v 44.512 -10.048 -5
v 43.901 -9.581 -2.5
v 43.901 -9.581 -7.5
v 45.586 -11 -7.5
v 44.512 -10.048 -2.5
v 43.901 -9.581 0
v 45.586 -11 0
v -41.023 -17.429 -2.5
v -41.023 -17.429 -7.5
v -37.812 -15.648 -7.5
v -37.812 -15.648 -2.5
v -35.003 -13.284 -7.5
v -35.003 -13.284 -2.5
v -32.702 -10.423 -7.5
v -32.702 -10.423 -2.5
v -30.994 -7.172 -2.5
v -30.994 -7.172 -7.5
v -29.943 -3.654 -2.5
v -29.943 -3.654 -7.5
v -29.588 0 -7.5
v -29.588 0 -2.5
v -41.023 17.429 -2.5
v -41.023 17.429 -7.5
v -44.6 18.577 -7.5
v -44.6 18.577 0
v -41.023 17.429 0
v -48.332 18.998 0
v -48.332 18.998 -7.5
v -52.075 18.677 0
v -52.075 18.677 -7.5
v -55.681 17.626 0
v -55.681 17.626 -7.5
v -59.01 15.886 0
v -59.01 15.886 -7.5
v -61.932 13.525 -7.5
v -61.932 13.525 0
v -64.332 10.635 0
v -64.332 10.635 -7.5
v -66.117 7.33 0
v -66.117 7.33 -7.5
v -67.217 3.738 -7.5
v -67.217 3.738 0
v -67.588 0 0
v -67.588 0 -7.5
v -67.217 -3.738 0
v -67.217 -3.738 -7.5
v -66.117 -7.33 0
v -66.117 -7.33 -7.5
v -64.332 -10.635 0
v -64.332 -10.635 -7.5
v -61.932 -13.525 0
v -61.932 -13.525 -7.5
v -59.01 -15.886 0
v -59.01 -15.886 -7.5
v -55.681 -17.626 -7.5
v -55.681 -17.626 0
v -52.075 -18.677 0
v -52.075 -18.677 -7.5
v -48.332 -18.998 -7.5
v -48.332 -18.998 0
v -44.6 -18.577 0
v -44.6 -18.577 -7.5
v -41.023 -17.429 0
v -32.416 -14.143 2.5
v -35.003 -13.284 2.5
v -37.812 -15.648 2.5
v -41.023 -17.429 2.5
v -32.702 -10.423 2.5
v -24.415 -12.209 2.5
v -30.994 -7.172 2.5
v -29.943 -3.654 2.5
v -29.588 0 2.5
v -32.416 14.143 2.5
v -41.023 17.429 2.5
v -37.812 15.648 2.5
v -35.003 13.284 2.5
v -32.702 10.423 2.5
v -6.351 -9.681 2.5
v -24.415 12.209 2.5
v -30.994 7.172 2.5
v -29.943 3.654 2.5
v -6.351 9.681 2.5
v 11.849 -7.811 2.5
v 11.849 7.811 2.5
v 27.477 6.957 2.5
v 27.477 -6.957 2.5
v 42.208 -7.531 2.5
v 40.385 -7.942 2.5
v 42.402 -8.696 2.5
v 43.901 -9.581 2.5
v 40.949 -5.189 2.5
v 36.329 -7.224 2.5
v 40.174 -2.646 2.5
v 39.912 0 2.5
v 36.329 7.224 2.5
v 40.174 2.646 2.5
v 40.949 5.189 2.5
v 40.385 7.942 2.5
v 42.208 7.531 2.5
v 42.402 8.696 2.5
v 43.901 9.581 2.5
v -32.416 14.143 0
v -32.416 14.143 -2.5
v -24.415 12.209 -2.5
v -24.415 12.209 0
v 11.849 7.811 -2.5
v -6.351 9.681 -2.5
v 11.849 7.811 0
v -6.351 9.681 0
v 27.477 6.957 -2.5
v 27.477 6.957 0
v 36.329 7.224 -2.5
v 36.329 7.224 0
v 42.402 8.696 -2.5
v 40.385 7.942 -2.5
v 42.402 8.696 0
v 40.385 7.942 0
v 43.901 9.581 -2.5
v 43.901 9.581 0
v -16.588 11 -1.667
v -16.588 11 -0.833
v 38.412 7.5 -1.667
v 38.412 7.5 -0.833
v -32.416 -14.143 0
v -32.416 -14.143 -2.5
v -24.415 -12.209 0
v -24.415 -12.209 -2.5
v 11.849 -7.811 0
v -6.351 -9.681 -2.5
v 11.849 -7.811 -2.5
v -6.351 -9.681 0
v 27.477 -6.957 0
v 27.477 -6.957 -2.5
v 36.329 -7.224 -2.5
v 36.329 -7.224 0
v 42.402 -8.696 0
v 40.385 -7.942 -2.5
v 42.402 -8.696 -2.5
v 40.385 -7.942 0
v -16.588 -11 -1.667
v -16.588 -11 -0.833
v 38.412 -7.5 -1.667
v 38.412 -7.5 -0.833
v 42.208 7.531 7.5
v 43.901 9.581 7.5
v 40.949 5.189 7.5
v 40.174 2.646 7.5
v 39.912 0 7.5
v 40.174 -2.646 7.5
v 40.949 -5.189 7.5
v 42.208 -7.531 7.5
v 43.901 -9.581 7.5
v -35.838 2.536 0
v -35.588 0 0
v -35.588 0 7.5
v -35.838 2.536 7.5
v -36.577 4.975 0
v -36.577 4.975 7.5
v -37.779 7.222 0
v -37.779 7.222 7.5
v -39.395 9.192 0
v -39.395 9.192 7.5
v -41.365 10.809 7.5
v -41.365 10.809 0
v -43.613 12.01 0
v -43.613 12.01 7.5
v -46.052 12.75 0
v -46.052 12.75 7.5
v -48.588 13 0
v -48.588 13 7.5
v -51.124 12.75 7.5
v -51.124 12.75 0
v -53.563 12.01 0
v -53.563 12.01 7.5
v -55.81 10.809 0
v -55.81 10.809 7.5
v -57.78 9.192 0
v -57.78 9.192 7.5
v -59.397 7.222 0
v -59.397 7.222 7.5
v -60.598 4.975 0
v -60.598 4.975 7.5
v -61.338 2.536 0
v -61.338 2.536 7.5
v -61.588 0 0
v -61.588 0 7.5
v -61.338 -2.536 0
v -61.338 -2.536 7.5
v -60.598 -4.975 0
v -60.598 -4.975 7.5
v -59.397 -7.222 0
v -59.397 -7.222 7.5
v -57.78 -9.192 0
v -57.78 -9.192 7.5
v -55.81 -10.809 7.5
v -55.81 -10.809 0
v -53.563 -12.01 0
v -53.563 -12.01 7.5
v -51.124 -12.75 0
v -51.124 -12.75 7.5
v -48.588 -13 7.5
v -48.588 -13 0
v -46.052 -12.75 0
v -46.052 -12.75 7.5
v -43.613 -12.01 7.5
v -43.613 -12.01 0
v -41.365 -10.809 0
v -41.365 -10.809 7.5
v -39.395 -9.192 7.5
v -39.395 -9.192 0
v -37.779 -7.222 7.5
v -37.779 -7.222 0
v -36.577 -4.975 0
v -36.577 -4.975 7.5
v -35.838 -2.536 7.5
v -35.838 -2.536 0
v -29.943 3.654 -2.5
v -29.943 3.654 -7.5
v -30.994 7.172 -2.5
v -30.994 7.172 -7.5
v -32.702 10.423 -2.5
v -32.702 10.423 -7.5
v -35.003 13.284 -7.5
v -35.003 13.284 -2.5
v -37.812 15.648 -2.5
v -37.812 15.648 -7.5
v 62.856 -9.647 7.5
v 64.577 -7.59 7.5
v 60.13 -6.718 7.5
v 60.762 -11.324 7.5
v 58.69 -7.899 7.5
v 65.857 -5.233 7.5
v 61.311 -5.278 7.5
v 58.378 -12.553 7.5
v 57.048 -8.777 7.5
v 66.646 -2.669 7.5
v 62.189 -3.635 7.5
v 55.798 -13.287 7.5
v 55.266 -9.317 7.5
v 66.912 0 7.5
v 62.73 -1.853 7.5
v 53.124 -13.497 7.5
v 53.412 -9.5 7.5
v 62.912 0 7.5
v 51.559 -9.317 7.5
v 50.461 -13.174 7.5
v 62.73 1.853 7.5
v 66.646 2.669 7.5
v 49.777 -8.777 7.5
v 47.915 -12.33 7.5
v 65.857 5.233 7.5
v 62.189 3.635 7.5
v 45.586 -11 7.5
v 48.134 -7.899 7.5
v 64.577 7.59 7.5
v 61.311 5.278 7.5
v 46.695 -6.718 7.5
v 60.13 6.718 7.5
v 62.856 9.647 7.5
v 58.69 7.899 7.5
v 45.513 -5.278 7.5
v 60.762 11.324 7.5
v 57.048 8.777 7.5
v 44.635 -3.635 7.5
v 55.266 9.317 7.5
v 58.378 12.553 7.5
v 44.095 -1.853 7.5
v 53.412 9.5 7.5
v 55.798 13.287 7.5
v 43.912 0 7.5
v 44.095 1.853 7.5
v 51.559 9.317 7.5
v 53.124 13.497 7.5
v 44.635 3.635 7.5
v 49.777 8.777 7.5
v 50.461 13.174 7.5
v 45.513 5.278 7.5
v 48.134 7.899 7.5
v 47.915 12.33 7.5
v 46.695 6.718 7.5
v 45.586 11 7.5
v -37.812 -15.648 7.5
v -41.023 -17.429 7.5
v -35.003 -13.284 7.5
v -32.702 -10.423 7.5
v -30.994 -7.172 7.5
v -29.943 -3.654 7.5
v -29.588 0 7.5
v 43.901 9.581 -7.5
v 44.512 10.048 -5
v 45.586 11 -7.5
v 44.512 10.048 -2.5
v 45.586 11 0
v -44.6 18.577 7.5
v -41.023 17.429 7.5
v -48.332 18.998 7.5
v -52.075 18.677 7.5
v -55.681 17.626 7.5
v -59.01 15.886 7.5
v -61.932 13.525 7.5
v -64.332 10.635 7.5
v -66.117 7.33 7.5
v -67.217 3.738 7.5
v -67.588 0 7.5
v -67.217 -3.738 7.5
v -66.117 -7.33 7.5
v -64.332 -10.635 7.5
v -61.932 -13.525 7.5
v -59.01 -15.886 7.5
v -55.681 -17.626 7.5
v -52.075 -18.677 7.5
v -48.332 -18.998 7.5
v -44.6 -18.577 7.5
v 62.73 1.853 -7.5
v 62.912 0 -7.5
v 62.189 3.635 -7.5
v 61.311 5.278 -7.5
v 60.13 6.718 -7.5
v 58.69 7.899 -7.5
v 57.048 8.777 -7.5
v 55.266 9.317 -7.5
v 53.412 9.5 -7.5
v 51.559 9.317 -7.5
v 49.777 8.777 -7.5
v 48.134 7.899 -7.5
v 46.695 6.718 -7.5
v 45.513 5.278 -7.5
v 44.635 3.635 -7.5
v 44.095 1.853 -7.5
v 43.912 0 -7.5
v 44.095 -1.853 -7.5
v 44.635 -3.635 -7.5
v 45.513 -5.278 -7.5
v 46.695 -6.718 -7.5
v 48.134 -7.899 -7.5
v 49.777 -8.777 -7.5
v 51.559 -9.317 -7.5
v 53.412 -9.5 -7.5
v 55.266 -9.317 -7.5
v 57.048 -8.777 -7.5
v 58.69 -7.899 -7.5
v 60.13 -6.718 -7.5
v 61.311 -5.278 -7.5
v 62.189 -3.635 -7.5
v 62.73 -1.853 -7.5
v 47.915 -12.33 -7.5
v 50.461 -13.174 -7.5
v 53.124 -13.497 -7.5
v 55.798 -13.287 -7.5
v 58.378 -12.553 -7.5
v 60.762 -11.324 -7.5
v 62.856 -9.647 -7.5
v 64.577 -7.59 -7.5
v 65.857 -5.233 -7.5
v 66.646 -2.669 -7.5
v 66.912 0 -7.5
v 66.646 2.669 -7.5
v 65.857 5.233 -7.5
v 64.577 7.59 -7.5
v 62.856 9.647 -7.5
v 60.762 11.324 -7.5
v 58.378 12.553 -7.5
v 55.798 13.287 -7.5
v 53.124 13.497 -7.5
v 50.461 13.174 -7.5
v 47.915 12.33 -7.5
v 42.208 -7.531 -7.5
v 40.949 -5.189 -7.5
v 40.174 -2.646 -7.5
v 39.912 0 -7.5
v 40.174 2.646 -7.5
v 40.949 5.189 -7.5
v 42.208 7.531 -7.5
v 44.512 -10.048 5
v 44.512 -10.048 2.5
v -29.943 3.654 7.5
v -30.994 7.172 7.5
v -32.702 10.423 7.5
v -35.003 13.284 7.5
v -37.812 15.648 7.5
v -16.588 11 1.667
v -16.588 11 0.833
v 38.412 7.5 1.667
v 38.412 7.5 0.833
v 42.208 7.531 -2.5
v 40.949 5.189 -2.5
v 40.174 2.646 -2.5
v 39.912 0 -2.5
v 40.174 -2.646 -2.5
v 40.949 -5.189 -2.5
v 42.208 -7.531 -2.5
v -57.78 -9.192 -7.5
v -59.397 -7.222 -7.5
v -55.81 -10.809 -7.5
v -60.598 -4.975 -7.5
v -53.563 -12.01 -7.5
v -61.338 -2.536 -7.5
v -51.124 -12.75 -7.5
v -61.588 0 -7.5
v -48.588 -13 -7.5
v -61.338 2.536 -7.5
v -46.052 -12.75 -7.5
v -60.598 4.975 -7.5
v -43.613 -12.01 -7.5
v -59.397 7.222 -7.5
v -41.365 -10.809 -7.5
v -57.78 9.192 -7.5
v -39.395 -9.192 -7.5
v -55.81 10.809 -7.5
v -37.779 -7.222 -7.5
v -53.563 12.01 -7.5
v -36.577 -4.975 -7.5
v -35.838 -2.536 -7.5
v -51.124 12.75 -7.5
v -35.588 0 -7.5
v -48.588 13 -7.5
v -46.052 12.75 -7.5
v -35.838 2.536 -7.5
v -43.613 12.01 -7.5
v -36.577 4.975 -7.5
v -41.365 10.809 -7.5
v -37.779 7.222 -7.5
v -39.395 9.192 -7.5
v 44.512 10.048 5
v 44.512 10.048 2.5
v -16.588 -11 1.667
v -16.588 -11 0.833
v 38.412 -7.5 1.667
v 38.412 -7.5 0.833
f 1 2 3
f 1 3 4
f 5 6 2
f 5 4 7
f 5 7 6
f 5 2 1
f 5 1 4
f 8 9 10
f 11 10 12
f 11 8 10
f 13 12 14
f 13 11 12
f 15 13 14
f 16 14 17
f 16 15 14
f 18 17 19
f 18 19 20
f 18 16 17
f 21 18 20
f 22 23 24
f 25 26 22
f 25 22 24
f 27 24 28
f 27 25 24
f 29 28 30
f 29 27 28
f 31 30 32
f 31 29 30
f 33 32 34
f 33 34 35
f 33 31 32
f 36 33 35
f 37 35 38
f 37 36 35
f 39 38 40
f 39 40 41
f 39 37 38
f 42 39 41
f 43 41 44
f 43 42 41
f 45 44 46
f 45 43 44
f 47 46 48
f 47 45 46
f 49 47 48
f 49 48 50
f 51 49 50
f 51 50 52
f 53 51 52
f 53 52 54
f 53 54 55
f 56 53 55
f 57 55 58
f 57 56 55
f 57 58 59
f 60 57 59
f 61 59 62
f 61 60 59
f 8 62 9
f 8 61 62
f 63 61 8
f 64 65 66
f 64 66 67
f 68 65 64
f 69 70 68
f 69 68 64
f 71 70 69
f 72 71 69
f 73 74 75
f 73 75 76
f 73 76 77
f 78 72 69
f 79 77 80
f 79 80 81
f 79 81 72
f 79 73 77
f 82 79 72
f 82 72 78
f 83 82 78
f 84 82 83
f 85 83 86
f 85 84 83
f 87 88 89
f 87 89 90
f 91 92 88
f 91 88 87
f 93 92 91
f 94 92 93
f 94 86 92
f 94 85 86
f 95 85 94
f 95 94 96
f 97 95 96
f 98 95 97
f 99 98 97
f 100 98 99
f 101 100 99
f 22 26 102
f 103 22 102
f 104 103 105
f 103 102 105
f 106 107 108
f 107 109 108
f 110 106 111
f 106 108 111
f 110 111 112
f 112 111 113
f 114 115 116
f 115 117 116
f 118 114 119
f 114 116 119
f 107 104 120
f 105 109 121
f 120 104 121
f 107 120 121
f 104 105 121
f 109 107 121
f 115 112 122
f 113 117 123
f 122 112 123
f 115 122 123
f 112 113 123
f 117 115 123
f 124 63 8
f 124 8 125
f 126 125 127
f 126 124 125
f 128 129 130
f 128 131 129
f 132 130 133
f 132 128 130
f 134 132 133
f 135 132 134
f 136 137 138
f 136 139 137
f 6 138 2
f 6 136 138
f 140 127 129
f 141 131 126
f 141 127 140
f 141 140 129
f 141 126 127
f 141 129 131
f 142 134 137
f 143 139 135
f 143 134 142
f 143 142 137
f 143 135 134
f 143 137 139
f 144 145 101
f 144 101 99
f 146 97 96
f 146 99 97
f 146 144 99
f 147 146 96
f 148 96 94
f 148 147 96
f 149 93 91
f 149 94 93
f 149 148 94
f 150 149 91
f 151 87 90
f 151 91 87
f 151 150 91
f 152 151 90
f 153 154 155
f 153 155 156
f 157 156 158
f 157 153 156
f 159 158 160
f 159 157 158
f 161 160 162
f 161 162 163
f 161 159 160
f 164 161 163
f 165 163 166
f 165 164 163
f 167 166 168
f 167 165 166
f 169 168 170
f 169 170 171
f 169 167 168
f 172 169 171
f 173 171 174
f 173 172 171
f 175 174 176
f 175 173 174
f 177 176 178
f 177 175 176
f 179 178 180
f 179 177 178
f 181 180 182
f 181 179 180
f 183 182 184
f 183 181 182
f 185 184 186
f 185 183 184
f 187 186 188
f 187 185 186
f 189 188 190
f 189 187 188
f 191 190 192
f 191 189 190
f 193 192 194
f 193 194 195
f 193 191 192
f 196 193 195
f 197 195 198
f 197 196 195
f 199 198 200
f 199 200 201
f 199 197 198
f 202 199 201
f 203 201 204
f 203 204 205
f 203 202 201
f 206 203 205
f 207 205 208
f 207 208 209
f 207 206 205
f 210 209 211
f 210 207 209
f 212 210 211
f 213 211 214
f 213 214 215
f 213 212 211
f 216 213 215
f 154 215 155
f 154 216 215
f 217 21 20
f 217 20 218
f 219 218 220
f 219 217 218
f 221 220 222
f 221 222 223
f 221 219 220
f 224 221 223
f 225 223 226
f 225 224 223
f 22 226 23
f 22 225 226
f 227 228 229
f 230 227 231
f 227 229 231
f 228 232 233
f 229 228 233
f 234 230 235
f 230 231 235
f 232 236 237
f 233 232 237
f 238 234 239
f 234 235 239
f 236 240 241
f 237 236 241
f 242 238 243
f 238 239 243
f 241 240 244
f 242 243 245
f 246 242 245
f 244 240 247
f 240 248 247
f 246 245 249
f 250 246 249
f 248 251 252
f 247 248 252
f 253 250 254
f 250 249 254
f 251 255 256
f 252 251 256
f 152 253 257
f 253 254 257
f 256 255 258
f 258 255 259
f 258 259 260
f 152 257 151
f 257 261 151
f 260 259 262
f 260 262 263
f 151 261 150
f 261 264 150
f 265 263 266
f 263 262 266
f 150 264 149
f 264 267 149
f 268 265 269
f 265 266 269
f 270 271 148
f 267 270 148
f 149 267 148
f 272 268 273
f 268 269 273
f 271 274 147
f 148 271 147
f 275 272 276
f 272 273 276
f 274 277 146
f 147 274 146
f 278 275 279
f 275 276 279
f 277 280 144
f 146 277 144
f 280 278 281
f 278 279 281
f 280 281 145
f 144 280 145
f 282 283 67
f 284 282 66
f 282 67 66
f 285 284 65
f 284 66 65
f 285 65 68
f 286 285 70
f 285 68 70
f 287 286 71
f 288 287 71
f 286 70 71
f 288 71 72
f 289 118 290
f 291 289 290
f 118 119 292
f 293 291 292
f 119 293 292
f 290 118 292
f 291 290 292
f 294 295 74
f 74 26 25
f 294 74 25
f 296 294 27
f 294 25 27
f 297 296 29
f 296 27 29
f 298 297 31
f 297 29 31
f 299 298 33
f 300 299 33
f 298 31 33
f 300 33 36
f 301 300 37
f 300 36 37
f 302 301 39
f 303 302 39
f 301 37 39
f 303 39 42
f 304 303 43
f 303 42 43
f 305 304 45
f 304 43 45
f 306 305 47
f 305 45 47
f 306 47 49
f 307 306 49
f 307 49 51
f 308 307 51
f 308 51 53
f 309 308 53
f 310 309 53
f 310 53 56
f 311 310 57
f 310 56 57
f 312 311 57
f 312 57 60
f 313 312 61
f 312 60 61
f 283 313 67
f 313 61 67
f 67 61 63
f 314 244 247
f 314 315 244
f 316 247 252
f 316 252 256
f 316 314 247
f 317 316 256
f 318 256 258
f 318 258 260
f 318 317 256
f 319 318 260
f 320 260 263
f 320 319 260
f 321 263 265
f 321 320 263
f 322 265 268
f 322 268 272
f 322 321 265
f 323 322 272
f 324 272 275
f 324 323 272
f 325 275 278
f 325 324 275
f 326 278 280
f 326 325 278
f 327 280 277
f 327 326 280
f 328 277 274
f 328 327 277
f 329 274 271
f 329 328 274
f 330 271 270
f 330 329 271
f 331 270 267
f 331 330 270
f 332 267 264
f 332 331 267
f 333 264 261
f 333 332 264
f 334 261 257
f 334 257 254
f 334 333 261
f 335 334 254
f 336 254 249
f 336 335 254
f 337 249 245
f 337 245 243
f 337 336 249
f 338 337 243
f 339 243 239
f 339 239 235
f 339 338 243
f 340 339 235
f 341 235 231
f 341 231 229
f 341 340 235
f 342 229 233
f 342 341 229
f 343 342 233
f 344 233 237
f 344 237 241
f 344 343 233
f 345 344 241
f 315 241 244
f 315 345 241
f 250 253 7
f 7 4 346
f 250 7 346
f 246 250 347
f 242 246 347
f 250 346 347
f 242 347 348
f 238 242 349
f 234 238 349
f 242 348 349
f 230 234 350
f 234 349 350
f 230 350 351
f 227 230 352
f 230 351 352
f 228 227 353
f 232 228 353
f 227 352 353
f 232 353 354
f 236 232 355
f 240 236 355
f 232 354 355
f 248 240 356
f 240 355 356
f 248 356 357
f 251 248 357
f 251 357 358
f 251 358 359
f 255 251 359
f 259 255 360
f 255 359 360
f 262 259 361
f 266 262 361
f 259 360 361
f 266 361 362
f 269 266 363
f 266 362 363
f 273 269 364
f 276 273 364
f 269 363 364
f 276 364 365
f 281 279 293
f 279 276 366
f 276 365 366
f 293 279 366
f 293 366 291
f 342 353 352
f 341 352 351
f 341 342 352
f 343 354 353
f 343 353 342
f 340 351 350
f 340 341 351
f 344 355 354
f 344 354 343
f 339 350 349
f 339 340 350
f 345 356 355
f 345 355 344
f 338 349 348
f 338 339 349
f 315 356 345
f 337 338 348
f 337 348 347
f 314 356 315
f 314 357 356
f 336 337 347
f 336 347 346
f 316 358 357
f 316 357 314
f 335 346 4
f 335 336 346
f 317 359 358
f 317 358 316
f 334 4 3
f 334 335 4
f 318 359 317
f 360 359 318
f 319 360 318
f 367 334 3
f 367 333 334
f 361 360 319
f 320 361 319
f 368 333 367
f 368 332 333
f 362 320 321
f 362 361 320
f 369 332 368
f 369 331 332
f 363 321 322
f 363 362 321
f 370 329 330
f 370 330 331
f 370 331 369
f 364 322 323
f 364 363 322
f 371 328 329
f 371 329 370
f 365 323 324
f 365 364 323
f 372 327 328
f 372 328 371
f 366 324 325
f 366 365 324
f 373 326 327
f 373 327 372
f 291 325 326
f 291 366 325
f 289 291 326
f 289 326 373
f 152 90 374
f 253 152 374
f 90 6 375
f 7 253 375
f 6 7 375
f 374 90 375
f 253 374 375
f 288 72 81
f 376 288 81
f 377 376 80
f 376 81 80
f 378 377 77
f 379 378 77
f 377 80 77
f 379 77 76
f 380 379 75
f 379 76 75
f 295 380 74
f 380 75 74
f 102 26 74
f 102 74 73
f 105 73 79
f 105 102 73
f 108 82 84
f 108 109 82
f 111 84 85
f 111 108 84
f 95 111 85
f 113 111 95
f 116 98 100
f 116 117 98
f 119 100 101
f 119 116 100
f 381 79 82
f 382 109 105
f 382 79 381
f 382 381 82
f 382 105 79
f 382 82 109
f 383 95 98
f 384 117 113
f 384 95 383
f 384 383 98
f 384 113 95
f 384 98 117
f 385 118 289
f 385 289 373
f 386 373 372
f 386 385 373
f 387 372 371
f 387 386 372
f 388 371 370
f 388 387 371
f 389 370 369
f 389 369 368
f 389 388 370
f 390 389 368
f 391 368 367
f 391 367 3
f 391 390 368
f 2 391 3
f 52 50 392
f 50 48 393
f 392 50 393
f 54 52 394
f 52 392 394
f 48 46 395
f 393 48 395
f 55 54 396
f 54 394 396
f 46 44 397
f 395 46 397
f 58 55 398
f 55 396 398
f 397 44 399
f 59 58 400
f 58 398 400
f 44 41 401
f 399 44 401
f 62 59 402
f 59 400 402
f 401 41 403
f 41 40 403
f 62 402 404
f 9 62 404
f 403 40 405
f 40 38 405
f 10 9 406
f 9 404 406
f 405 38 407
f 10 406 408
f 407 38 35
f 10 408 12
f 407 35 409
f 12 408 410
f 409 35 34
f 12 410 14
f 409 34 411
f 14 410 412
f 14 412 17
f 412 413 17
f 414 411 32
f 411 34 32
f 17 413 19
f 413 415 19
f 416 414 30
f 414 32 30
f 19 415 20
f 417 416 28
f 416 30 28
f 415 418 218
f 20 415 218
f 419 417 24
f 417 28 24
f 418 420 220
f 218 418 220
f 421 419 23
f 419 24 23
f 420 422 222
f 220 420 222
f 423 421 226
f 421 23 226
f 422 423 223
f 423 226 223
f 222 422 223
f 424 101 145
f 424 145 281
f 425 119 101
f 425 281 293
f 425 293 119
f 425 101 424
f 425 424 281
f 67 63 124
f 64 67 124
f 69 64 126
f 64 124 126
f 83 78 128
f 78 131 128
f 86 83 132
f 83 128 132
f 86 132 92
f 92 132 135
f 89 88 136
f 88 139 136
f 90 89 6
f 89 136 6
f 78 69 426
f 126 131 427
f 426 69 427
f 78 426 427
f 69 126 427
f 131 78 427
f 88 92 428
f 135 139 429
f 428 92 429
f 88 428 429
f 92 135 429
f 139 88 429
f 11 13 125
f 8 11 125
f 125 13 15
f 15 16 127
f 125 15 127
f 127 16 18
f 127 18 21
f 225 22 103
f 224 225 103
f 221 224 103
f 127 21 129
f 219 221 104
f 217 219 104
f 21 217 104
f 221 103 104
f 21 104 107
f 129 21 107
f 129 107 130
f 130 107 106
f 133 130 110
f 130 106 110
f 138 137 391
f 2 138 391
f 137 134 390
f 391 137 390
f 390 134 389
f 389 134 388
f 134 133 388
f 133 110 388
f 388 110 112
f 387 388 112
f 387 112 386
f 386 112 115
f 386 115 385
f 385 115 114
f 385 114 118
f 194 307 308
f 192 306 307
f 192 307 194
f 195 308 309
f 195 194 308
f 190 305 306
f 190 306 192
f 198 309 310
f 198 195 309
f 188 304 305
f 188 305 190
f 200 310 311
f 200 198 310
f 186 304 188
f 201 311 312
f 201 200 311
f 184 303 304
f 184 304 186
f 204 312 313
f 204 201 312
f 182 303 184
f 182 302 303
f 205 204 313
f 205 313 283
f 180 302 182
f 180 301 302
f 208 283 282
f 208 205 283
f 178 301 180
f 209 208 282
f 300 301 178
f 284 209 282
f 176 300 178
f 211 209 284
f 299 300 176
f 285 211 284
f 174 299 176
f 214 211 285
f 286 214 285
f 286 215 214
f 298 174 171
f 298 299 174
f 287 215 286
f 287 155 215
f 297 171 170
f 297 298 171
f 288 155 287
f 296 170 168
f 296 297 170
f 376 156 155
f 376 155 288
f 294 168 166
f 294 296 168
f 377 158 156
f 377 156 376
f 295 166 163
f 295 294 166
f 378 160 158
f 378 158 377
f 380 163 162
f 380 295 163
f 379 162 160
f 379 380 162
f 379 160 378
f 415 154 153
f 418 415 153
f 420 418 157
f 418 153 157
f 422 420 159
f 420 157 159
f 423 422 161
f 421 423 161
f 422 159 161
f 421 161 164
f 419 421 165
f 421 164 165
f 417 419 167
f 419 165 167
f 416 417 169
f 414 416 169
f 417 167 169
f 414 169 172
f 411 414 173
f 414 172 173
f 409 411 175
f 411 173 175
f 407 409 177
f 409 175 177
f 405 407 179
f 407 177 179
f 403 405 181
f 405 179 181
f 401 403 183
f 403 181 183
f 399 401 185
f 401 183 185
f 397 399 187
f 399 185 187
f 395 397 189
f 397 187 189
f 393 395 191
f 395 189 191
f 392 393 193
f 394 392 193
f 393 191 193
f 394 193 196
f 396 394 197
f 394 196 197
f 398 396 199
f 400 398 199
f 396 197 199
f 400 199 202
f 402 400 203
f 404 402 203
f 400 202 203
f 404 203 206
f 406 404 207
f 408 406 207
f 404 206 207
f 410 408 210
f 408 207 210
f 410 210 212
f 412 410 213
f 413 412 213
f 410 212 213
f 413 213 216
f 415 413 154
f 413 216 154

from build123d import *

# Parameters (mm, degrees)
F0_R          = 9.5
F1_DEPTH      = 7.5
F1_DEPTH_BACK = 7.5
F2_DEPTH      = 2.5
F2_DEPTH_BACK = 2.5
F0_R_2        = 13
F3_DEPTH      = 7.5
F3_DEPTH_BACK = 7.5


with BuildPart() as f1:
    # F0 (on Top) → F1 (new body, two sides)
    with BuildSketch(Plane.XY) as f1_sk:
        with BuildLine():
            add(Edge.make_bspline(
                [(43.9010166471, 9.5806238455), (44.5485219286, 10.0415760161), (45.0751125089, 10.5266840027), (45.5859115044, 11)],
                knots=[0.9350422263, 0.9350422263, 0.9350422263, 0.9350422263, 1, 1, 1, 1], degree=3))
            ThreePointArc((43.9010166471, 9.5806238455), (39.9121494256, 0), (43.9010166471, -9.5806238455))
            add(Edge.make_bspline(
                [(43.9010166471, -9.5806238455), (44.5485219286, -10.0415760161), (45.0751125089, -10.5266840027), (45.5859115044, -11)],
                knots=[0.9350422263, 0.9350422263, 0.9350422263, 0.9350422263, 1, 1, 1, 1], degree=3))
            ThreePointArc((45.5859115044, -11), (59.6006786557, -11.9980042494), (66.9121494256, 0))
            ThreePointArc((66.9121494256, 0), (59.6006786557, 11.9980042494), (45.5859115044, 11))
        make_face()
        with Locations((53.4121494256, 0)):
            Circle(F0_R, mode=Mode.SUBTRACT)
    extrude(amount=F1_DEPTH)
    extrude(f1_sk.sketch, amount=-F1_DEPTH_BACK)

    # F0 (on Top) → F2 (join, two sides)
    with BuildSketch(Plane.XY) as f2_sk:
        with BuildLine():
            ThreePointArc((-41.0227190043, 17.4289639487), (-32.7017324231, 10.4226316295), (-29.5878505744, 0))
            ThreePointArc((-29.5878505744, 0), (-32.7017324231, -10.4226316295), (-41.0227190043, -17.4289639487))
            add(Edge.make_bspline(
                [(-41.0227190043, -17.4289639487), (-31.8343407137, -13.4407010268), (-20.2692157487, -11.0133845608), (34.5806966737, -4.8452402532), (42.7048954376, -8.7291177906), (43.9010166471, -9.5806238455)],
                knots=[0, 0, 0, 0, 0.3290608689, 0.8150472654, 0.9350422263, 0.9350422263, 0.9350422263, 0.9350422263], degree=3))
            ThreePointArc((43.9010166471, -9.5806238455), (39.9121494256, 0), (43.9010166471, 9.5806238455))
            add(Edge.make_bspline(
                [(-41.0227190043, 17.4289639487), (-31.8343407137, 13.4407010268), (-20.2692157487, 11.0133845608), (34.5806966737, 4.8452402532), (42.7048954376, 8.7291177906), (43.9010166471, 9.5806238455)],
                knots=[0, 0, 0, 0, 0.3290608689, 0.8150472654, 0.9350422263, 0.9350422263, 0.9350422263, 0.9350422263], degree=3))
        make_face()
    extrude(amount=F2_DEPTH)
    extrude(f2_sk.sketch, amount=-F2_DEPTH_BACK)

    # F0 (on Top) → F3 (join, two sides)
    with BuildSketch(Plane.XY) as f3_sk:
        with BuildLine():
            ThreePointArc((-41.0227190043, -17.4289639487), (-32.7017324231, -10.4226316295), (-29.5878505744, 0))
            ThreePointArc((-29.5878505744, 0), (-32.7017324231, 10.4226316295), (-41.0227190043, 17.4289639487))
            ThreePointArc((-41.0227190043, 17.4289639487), (-67.5878505744, 0), (-41.0227190043, -17.4289639487))
        make_face()
        with Locations((-48.5878505744, 0)):
            Circle(F0_R_2, mode=Mode.SUBTRACT)
    extrude(amount=F3_DEPTH)
    extrude(f3_sk.sketch, amount=-F3_DEPTH_BACK)


solid = f1.part
